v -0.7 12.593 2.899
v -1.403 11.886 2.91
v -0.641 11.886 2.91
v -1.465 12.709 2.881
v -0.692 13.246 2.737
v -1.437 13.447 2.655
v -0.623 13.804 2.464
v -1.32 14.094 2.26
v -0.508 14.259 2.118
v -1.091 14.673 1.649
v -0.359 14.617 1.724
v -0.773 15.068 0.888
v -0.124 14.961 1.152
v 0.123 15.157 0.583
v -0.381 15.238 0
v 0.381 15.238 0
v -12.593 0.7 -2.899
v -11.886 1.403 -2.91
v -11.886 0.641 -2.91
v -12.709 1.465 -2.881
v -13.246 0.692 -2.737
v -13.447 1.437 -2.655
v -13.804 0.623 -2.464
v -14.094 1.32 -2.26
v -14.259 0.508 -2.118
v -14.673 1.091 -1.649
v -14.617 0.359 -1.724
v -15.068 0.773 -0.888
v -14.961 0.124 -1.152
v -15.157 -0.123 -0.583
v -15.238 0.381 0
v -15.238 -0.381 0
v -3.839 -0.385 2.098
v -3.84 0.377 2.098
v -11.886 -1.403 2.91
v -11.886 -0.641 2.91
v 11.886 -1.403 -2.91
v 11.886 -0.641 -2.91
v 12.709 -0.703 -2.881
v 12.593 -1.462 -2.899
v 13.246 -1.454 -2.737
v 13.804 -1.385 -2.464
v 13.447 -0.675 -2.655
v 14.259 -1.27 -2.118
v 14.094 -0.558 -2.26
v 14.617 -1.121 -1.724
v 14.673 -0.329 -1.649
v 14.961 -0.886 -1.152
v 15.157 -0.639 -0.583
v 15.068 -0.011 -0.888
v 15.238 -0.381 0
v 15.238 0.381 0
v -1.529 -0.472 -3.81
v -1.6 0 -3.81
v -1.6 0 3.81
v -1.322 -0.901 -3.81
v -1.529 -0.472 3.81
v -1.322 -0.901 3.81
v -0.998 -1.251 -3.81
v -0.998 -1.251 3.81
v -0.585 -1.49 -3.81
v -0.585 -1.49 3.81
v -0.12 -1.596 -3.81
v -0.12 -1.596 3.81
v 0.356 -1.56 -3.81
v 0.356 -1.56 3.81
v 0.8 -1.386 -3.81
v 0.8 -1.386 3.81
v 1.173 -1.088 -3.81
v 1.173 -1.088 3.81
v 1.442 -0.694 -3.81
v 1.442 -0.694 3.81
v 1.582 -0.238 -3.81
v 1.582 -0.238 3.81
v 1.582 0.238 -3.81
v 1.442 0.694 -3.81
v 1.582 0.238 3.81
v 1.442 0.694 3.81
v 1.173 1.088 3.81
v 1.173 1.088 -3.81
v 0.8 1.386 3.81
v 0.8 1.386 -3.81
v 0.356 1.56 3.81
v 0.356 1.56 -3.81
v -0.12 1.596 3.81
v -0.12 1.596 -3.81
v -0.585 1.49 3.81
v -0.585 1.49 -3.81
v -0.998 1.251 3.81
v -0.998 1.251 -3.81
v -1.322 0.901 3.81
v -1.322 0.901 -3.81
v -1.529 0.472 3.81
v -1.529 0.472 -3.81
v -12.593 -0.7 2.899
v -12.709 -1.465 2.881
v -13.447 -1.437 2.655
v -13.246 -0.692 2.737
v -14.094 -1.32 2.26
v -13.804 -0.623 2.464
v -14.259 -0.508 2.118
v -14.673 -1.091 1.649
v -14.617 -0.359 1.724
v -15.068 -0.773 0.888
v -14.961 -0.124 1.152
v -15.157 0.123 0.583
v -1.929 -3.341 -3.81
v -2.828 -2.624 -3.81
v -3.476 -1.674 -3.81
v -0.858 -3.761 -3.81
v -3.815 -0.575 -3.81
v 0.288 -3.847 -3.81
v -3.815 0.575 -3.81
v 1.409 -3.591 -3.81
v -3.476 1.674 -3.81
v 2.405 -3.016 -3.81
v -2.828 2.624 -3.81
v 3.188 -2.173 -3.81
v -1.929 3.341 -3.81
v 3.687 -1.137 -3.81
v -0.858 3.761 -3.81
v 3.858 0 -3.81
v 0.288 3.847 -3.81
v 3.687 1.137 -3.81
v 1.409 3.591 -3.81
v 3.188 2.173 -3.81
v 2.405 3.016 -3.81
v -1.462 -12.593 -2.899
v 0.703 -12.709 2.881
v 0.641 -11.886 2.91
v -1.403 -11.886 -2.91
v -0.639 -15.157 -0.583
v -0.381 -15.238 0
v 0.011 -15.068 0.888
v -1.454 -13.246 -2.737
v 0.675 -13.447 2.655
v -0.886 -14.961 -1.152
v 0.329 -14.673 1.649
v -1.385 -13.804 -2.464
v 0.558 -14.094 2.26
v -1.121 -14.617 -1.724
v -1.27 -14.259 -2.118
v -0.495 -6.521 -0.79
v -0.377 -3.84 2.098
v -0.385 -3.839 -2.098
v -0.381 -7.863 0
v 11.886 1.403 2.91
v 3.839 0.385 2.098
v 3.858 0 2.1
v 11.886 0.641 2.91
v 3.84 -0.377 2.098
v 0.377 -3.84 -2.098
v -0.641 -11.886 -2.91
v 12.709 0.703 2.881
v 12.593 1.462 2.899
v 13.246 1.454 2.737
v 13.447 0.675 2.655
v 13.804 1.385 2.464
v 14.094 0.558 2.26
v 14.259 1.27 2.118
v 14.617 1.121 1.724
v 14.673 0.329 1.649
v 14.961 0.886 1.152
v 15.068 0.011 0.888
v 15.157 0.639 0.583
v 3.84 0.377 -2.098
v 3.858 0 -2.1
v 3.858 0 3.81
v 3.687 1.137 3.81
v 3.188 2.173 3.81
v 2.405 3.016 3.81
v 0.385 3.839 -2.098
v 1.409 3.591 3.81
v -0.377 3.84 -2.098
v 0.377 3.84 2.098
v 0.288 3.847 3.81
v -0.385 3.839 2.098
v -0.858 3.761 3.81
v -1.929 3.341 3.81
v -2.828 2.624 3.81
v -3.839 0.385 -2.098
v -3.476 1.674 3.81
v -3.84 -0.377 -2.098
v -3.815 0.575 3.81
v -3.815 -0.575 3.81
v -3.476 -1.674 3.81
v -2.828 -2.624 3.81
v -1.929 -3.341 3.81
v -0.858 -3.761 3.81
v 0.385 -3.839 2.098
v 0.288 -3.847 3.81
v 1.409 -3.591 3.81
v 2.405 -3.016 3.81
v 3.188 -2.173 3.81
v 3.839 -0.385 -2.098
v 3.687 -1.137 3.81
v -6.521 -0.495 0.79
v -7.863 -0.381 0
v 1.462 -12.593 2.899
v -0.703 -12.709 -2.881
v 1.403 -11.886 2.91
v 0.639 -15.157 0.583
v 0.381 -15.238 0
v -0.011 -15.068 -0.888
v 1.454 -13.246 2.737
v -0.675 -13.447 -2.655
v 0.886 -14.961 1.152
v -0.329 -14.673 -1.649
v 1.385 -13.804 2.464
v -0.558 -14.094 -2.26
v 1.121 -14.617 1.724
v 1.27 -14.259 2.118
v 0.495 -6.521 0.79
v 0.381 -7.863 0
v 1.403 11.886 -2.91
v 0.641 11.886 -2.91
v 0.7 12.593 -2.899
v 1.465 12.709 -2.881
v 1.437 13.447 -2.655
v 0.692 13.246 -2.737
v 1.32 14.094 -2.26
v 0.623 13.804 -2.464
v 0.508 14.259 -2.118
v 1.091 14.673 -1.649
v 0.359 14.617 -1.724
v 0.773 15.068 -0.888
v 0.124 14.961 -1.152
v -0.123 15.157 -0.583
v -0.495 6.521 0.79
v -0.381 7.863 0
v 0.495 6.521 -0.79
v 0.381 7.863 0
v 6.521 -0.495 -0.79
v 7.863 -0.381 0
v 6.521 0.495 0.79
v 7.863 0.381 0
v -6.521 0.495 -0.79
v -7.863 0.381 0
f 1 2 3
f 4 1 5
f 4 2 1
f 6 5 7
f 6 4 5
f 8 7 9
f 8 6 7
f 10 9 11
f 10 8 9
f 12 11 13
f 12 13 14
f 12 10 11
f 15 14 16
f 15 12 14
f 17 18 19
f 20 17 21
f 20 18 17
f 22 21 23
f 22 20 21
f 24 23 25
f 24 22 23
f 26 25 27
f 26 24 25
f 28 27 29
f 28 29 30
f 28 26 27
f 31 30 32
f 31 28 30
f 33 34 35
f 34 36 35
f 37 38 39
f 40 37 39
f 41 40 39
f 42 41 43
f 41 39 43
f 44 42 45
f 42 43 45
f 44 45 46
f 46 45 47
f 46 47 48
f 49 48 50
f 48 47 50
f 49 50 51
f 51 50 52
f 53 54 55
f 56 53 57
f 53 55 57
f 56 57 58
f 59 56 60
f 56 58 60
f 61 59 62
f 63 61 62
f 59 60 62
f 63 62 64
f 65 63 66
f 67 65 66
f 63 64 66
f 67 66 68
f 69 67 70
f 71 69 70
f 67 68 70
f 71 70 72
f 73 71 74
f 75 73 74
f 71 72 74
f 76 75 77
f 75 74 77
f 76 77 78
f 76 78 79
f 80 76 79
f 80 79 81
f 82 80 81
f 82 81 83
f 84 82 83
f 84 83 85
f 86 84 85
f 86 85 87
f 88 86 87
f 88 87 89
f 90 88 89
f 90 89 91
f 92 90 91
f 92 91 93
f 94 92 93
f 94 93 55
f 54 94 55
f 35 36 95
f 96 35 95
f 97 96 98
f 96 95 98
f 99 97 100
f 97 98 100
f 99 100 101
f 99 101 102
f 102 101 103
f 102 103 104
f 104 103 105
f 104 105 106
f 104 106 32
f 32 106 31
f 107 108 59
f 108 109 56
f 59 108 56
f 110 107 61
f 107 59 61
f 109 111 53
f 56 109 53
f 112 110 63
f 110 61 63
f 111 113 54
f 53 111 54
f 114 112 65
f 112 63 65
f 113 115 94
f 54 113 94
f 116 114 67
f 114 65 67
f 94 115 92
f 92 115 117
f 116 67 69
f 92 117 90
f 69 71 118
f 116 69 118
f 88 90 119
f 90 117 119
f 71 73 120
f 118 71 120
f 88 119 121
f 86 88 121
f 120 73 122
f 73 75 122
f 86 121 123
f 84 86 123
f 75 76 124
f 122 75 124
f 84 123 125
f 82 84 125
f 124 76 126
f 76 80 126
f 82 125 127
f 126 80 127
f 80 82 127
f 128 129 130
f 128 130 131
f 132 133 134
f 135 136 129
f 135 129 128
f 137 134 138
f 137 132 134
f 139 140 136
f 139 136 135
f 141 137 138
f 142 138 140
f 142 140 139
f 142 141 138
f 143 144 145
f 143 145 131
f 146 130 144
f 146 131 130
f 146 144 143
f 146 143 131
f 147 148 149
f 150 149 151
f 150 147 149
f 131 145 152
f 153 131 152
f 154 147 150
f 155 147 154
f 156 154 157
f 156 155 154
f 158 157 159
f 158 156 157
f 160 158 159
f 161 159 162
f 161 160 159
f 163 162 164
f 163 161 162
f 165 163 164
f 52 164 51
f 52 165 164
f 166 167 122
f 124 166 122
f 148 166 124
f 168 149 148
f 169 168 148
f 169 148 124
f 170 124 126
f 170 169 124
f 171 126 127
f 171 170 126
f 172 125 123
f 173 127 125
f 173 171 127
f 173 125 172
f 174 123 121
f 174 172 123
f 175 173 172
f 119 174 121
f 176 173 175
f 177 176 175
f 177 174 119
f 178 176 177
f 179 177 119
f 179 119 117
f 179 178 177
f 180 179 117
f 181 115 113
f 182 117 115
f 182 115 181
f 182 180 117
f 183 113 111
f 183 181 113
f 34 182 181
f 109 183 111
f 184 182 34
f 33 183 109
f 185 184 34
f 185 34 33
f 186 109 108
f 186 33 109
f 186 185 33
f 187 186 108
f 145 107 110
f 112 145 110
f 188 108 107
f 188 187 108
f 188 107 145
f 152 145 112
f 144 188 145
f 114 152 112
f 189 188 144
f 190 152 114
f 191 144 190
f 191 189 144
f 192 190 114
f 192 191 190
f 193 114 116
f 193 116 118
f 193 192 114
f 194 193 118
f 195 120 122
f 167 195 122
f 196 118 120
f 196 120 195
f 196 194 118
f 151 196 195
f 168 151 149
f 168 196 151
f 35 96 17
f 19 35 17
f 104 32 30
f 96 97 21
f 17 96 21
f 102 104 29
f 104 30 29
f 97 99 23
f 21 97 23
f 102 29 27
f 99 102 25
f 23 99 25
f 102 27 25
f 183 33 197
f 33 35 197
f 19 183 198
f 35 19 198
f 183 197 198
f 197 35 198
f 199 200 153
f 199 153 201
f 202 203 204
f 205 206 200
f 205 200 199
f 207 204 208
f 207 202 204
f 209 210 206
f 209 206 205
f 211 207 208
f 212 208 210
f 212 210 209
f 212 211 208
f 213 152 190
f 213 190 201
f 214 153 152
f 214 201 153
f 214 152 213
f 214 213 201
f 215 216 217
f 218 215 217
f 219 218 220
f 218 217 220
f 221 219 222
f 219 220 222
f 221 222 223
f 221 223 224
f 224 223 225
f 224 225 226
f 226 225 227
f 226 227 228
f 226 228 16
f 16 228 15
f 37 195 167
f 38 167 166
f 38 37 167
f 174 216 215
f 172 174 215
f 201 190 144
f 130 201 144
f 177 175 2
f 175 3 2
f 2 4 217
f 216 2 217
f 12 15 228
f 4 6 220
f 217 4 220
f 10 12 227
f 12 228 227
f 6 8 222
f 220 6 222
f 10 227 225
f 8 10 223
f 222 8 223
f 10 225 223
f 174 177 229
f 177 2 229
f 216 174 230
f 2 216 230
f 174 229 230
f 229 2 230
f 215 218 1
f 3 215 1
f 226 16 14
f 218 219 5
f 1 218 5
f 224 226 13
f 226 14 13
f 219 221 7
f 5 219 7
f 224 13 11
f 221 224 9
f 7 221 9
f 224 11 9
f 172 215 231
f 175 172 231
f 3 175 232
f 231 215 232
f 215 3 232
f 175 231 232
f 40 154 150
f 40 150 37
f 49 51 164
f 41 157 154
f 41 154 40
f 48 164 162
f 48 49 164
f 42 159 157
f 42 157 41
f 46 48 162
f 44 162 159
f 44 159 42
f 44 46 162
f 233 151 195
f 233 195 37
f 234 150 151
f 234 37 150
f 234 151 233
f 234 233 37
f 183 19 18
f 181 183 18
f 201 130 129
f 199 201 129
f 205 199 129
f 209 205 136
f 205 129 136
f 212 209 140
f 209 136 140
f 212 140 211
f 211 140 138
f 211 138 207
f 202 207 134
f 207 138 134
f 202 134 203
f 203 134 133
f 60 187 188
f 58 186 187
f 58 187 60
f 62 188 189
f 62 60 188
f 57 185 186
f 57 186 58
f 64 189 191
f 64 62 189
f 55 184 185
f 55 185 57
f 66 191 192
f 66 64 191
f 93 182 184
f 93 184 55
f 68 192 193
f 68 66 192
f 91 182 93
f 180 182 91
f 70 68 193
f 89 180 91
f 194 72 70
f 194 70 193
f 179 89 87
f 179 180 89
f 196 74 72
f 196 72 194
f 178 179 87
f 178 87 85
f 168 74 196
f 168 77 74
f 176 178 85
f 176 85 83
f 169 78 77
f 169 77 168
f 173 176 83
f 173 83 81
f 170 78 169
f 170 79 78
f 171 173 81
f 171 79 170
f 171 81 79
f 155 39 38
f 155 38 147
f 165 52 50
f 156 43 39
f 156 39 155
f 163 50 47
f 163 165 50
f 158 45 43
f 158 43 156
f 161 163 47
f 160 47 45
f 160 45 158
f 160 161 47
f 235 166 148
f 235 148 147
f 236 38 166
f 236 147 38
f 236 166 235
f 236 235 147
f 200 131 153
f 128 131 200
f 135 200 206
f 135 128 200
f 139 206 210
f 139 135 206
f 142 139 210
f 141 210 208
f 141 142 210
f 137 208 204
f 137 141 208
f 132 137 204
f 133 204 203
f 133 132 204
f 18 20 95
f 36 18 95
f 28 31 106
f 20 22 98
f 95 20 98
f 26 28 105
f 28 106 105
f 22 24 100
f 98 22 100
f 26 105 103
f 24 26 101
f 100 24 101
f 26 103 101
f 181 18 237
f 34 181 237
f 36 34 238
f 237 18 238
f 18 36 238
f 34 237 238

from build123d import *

# Parameters (mm, degrees)
F0_R          = 3.85802972
F2_DEPTH      = 3.81
F2_DEPTH_BACK = 3.81
F4_D          = 3.2004
F6_W          = 0.762
F6_H          = 4.191
F10_W         = 0.762
F10_H         = 4.191
F14_W         = 0.762
F14_H         = 4.191
F17_W         = 0.762
F17_H         = 4.191
F25_T1_DEPTH  = 17.6167754913
F25_T3_DEPTH  = 17.6167754913
F25_T5_DEPTH  = 17.6167754913
F25_T7_DEPTH  = 17.6167754913


# Not quite as in the source:
# - a fillet or chamfer that OpenCascade refuses, or shapes differently, is made with other operations: its cross-section is extruded or revolved along the edge and cut away or added


with BuildPart() as f2:
    # F0 (on Top) → F2 (new body, two sides)
    with BuildSketch(Plane.XY) as f2_sk:
        Circle(F0_R)
    extrude(amount=F2_DEPTH)
    extrude(f2_sk.sketch, amount=-F2_DEPTH_BACK)

    # F4 (through all)
    with Locations(Plane(origin=(0, 0, -3.81), x_dir=(1, 0, 0), z_dir=(0, 0, -1))):
        with Locations((0, 0)):
            Hole(F4_D / 2)

    # F6 (on offset) → F21 section 0
    with BuildSketch(Plane.YZ.offset(3.81)):
        Rectangle(F6_W, F6_H)
    # F20 (on offset) → F21 section 1
    with BuildSketch(Plane.YZ.offset(15.24)):
        Polygon((-1.8273555028, -3.2485676474), (-1.0653555028, -3.2485676474), (1.8273555028, 3.2485676474), (1.0653555028, 3.2485676474), align=None)
    loft()

    # F10 (on offset) → F22 section 0
    with BuildSketch(Plane.XZ.offset(-3.81)):
        Rectangle(F10_W, F10_H)
    # F11 (on offset) → F22 section 1
    with BuildSketch(Plane.XZ.offset(-15.24)):
        Polygon((-1.8273555028, 3.2485676474), (1.0653555028, -3.2485676474), (1.8273555028, -3.2485676474), (-1.0653555028, 3.2485676474), align=None)
    loft()

    # F14 (on offset) → F23 section 0
    with BuildSketch(Plane.YZ.offset(-3.81)):
        Rectangle(F14_W, F14_H)
    # F19 (on offset) → F23 section 1
    with BuildSketch(Plane.YZ.offset(-15.24)):
        Polygon((1.0653555028, -3.2485676474), (1.8273555028, -3.2485676474), (-1.0653555028, 3.2485676474), (-1.8273555028, 3.2485676474), align=None)
    loft()

    # F17 (on offset) → F24 section 0
    with BuildSketch(Plane.XZ.offset(3.81)):
        Rectangle(F17_W, F17_H)
    # F18 (on offset) → F24 section 1
    with BuildSketch(Plane.XZ.offset(15.24)):
        Polygon((-1.8273555028, -3.2485676474), (-1.0653555028, -3.2485676474), (1.8273555028, 3.2485676474), (1.0653555028, 3.2485676474), align=None)
    loft()

    # F25: fillet of radius 3.048 on 8 edges, made by hand

    # F25_s2 → F25_t1 (cut)
    with BuildSketch(Plane.XZ.offset(-7.3620322429)):
        with BuildLine():
            ThreePointArc((-11.8860680784, 2.9102202816), (-14.2362386728, 2.1384513865), (-15.24, -0.1223874509))
            Line((-15.24, -0.1223874509), (-15.24, 3.2485676474))
            Line((-15.24, 3.2485676474), (-11.8860680784, 2.9102202816))
        make_face()
        with BuildLine():
            ThreePointArc((11.8860680784, -2.9102202816), (14.2362386728, -2.1384513865), (15.24, 0.1223874509))
            Line((15.24, 0.1223874509), (15.24, -3.2485676474))
            Line((15.24, -3.2485676474), (11.8860680784, -2.9102202816))
        make_face()
    extrude(amount=F25_T1_DEPTH, mode=Mode.SUBTRACT)

    # F25_s4 → F25_t3 (cut)
    with BuildSketch(Plane.XZ.offset(-10.2547432484)):
        with BuildLine():
            ThreePointArc((-11.8860680784, -2.9102202816), (-14.2362386728, -2.1384513865), (-15.24, 0.1223874509))
            Line((-15.24, 0.1223874509), (-15.24, -3.2485676474))
            Line((-15.24, -3.2485676474), (-11.8860680784, -2.9102202816))
        make_face()
        with BuildLine():
            ThreePointArc((11.8860680784, 2.9102202816), (14.2362386728, 2.1384513865), (15.24, -0.1223874509))
            Line((15.24, -0.1223874509), (15.24, 3.2485676474))
            Line((15.24, 3.2485676474), (11.8860680784, 2.9102202816))
        make_face()
    extrude(amount=F25_T3_DEPTH, mode=Mode.SUBTRACT)

    # F25_s6 → F25_t5 (cut)
    with BuildSketch(Plane.YZ.offset(-7.3620322429)):
        with BuildLine():
            ThreePointArc((11.8860680784, -2.9102202816), (14.2362386728, -2.1384513865), (15.24, 0.1223874509))
            Line((15.24, 0.1223874509), (15.24, -3.2485676474))
            Line((15.24, -3.2485676474), (11.8860680784, -2.9102202816))
        make_face()
        with BuildLine():
            ThreePointArc((-11.8860680784, 2.9102202816), (-14.2362386728, 2.1384513865), (-15.24, -0.1223874509))
            Line((-15.24, -0.1223874509), (-15.24, 3.2485676474))
            Line((-15.24, 3.2485676474), (-11.8860680784, 2.9102202816))
        make_face()
    extrude(amount=F25_T5_DEPTH, mode=Mode.SUBTRACT)

    # F25_s8 → F25_t7 (cut)
    with BuildSketch(Plane.YZ.offset(-10.2547432484)):
        with BuildLine():
            ThreePointArc((11.8860680784, 2.9102202816), (14.2362386728, 2.1384513865), (15.24, -0.1223874509))
            Line((15.24, -0.1223874509), (15.24, 3.2485676474))
            Line((15.24, 3.2485676474), (11.8860680784, 2.9102202816))
        make_face()
        with BuildLine():
            ThreePointArc((-11.8860680784, -2.9102202816), (-14.2362386728, -2.1384513865), (-15.24, 0.1223874509))
            Line((-15.24, 0.1223874509), (-15.24, -3.2485676474))
            Line((-15.24, -3.2485676474), (-11.8860680784, -2.9102202816))
        make_face()
    extrude(amount=F25_T7_DEPTH, mode=Mode.SUBTRACT)


solid = f2.part
